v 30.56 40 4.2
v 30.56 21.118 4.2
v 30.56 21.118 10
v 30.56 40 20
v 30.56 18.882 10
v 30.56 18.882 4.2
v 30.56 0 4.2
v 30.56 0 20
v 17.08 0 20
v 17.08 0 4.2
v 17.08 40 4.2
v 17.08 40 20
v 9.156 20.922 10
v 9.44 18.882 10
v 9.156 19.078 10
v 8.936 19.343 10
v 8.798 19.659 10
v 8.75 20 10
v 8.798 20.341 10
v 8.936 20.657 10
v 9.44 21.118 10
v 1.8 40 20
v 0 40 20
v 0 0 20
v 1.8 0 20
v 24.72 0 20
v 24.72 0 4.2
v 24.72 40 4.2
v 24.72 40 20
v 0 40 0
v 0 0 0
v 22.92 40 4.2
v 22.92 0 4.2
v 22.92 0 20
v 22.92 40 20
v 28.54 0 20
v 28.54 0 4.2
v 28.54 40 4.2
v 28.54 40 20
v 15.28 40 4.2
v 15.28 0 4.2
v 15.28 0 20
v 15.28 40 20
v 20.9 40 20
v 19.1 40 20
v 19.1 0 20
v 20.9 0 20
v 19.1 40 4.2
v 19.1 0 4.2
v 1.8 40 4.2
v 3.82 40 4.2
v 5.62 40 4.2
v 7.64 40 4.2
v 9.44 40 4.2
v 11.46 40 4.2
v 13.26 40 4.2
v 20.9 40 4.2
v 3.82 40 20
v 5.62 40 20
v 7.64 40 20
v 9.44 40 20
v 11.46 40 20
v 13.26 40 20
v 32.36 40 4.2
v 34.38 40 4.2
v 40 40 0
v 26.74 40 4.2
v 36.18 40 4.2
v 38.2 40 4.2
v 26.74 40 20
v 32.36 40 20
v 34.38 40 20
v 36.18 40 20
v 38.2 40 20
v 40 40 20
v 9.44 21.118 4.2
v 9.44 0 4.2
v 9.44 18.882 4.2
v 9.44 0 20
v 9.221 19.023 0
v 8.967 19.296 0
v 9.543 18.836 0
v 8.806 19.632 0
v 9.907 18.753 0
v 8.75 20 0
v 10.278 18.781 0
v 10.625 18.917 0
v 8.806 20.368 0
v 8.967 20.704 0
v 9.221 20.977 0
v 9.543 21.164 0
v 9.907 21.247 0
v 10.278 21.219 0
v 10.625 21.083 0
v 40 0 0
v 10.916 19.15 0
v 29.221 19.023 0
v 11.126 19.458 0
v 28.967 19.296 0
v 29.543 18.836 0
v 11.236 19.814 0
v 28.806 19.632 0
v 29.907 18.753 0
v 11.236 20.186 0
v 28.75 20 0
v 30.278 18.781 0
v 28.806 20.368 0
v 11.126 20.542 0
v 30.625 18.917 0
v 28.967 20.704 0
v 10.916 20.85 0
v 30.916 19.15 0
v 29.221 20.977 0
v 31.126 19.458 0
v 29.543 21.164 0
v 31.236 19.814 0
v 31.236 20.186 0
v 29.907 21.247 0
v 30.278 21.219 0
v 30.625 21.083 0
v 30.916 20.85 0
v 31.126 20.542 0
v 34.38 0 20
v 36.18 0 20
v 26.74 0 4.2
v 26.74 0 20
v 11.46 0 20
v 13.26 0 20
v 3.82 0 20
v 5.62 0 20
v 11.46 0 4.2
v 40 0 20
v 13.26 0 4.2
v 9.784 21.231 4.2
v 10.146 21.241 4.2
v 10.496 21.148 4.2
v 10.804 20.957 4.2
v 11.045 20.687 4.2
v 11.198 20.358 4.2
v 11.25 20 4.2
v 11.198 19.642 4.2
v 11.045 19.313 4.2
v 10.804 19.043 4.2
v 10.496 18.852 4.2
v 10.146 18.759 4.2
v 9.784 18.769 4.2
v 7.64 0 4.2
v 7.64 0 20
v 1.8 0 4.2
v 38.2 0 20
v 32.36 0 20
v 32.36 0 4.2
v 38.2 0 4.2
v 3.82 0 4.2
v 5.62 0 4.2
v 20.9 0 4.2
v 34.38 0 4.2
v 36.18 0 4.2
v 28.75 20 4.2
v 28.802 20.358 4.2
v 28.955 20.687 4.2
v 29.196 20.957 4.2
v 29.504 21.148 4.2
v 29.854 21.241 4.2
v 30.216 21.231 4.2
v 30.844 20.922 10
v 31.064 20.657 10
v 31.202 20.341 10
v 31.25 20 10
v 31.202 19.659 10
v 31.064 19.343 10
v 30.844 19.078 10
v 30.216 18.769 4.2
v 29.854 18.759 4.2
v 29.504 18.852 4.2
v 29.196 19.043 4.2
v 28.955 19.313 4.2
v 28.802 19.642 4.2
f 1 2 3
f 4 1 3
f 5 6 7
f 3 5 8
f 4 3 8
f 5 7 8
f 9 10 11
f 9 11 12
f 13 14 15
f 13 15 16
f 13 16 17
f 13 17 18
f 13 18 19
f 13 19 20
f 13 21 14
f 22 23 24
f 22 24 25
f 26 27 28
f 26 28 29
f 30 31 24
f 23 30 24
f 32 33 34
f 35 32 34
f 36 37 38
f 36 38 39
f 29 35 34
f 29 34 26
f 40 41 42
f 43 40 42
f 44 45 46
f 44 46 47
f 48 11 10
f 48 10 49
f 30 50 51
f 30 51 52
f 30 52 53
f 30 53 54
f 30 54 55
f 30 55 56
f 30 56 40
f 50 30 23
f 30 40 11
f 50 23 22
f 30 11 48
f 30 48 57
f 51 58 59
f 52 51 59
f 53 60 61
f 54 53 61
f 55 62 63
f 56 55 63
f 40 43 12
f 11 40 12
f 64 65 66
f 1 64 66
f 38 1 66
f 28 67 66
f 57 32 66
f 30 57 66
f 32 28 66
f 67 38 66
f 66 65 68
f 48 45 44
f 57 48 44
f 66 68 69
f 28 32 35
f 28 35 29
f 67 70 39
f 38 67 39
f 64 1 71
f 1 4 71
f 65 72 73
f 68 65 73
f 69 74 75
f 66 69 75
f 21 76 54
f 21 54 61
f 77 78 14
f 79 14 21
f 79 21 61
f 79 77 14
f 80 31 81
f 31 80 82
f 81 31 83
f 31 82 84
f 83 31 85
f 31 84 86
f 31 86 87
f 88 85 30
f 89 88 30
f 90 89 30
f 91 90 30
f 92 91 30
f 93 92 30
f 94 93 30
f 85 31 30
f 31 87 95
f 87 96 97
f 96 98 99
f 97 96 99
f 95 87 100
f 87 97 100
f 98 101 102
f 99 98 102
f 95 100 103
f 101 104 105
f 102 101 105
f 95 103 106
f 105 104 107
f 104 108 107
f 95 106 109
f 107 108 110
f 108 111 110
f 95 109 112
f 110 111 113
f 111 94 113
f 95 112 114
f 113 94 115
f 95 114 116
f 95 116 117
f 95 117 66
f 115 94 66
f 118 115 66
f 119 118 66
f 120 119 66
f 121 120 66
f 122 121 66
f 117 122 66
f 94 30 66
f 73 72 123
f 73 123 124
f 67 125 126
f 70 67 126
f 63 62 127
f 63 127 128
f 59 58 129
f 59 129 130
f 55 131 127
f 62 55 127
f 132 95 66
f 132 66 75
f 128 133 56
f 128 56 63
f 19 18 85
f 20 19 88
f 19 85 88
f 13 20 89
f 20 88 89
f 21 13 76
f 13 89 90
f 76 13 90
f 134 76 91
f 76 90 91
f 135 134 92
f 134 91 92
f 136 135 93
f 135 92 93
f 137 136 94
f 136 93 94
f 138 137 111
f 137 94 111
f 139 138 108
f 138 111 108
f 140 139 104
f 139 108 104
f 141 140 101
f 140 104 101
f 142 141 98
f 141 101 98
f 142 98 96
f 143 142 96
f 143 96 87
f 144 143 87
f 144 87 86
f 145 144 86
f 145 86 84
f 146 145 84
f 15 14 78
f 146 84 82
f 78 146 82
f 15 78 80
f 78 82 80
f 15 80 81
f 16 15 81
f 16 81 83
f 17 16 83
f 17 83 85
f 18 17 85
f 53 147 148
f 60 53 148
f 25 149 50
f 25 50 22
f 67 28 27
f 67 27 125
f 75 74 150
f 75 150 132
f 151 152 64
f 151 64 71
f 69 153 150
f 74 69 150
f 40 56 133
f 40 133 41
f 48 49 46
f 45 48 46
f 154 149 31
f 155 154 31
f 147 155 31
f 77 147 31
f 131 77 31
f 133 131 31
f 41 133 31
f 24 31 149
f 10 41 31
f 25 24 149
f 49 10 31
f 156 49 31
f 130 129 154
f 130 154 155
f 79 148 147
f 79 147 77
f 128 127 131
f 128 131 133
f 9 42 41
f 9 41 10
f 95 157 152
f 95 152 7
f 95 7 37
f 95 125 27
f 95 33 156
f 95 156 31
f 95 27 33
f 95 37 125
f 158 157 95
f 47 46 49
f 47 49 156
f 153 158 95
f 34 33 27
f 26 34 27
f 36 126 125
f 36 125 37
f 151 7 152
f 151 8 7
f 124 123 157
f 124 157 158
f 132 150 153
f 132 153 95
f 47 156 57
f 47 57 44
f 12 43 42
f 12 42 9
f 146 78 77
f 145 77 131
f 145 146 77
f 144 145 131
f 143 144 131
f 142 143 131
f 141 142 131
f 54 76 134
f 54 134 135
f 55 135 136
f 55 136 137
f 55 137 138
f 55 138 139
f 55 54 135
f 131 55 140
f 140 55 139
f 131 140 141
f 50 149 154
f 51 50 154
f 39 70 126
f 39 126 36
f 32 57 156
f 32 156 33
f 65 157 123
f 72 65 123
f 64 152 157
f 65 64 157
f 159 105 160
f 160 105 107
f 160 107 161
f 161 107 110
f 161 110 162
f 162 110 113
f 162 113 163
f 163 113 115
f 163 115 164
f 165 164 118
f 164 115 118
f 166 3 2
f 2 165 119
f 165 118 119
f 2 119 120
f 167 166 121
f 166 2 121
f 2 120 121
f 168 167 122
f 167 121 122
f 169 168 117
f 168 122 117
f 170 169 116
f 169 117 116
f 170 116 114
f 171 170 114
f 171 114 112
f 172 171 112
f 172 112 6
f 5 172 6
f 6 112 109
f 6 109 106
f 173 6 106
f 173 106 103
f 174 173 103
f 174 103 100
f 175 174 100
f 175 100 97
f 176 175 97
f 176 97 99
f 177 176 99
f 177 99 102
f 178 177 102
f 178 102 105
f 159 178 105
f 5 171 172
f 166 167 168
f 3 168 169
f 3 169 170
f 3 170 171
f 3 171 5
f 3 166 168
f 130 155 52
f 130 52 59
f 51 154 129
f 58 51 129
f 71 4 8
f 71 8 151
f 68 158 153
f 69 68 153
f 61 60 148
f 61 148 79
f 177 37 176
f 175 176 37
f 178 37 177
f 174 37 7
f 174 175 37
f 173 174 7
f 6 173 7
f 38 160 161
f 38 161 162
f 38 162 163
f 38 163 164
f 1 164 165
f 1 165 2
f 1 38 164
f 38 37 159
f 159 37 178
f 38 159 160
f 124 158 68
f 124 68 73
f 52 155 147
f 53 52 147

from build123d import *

# Parameters (mm, degrees)
ESQUISSE1_W                = 40
ESQUISSE1_H                = 40
BOSS_EXTRU_1_DEPTH         = 4.2
ESQUISSE2_W                = 1.8
ESQUISSE2_H                = 15.8
BOSS_EXTRU_2_DEPTH         = 40
R_P_TITION_LIN_AIRE1_COUNT = 11
R_P_TITION_LIN_AIRE1_PITCH = 3.82
ESQUISSE3_R                = 1.25
ENL_V_MAT_EXTRU_1_DEPTH    = 10


with BuildPart() as part:
    # Esquisse1 → Boss.-Extru.1 (new body)
    with BuildSketch(Plane.XY):
        with Locations((20, 20)):
            Rectangle(ESQUISSE1_W, ESQUISSE1_H)
    extrude(amount=BOSS_EXTRU_1_DEPTH)

    # Esquisse2 → Boss.-Extru.2 (add)
    with BuildSketch(Plane.XZ):
        with Locations((0.9, 12.1)):
            Rectangle(ESQUISSE2_W, ESQUISSE2_H)
    boss_extru_2 = extrude(amount=-BOSS_EXTRU_2_DEPTH)

    # Répétition linéaire1: Boss.-Extru.2 ×11
    with Locations(*[(i * R_P_TITION_LIN_AIRE1_PITCH, 0, 0) for i in range(1, R_P_TITION_LIN_AIRE1_COUNT)]):
        add(boss_extru_2)

    # Esquisse3 → Enlèv. mat.-Extru.1 (cut)
    with BuildSketch(Plane(origin=(0, 0, 0), x_dir=(-1, 0, 0), z_dir=(0, 0, -1))):
        with Locations((-30, 20)):
            Circle(ESQUISSE3_R)
        with Locations((-10, 20)):
            Circle(ESQUISSE3_R)
    extrude(amount=-ENL_V_MAT_EXTRU_1_DEPTH, mode=Mode.SUBTRACT)


solid = part.part
